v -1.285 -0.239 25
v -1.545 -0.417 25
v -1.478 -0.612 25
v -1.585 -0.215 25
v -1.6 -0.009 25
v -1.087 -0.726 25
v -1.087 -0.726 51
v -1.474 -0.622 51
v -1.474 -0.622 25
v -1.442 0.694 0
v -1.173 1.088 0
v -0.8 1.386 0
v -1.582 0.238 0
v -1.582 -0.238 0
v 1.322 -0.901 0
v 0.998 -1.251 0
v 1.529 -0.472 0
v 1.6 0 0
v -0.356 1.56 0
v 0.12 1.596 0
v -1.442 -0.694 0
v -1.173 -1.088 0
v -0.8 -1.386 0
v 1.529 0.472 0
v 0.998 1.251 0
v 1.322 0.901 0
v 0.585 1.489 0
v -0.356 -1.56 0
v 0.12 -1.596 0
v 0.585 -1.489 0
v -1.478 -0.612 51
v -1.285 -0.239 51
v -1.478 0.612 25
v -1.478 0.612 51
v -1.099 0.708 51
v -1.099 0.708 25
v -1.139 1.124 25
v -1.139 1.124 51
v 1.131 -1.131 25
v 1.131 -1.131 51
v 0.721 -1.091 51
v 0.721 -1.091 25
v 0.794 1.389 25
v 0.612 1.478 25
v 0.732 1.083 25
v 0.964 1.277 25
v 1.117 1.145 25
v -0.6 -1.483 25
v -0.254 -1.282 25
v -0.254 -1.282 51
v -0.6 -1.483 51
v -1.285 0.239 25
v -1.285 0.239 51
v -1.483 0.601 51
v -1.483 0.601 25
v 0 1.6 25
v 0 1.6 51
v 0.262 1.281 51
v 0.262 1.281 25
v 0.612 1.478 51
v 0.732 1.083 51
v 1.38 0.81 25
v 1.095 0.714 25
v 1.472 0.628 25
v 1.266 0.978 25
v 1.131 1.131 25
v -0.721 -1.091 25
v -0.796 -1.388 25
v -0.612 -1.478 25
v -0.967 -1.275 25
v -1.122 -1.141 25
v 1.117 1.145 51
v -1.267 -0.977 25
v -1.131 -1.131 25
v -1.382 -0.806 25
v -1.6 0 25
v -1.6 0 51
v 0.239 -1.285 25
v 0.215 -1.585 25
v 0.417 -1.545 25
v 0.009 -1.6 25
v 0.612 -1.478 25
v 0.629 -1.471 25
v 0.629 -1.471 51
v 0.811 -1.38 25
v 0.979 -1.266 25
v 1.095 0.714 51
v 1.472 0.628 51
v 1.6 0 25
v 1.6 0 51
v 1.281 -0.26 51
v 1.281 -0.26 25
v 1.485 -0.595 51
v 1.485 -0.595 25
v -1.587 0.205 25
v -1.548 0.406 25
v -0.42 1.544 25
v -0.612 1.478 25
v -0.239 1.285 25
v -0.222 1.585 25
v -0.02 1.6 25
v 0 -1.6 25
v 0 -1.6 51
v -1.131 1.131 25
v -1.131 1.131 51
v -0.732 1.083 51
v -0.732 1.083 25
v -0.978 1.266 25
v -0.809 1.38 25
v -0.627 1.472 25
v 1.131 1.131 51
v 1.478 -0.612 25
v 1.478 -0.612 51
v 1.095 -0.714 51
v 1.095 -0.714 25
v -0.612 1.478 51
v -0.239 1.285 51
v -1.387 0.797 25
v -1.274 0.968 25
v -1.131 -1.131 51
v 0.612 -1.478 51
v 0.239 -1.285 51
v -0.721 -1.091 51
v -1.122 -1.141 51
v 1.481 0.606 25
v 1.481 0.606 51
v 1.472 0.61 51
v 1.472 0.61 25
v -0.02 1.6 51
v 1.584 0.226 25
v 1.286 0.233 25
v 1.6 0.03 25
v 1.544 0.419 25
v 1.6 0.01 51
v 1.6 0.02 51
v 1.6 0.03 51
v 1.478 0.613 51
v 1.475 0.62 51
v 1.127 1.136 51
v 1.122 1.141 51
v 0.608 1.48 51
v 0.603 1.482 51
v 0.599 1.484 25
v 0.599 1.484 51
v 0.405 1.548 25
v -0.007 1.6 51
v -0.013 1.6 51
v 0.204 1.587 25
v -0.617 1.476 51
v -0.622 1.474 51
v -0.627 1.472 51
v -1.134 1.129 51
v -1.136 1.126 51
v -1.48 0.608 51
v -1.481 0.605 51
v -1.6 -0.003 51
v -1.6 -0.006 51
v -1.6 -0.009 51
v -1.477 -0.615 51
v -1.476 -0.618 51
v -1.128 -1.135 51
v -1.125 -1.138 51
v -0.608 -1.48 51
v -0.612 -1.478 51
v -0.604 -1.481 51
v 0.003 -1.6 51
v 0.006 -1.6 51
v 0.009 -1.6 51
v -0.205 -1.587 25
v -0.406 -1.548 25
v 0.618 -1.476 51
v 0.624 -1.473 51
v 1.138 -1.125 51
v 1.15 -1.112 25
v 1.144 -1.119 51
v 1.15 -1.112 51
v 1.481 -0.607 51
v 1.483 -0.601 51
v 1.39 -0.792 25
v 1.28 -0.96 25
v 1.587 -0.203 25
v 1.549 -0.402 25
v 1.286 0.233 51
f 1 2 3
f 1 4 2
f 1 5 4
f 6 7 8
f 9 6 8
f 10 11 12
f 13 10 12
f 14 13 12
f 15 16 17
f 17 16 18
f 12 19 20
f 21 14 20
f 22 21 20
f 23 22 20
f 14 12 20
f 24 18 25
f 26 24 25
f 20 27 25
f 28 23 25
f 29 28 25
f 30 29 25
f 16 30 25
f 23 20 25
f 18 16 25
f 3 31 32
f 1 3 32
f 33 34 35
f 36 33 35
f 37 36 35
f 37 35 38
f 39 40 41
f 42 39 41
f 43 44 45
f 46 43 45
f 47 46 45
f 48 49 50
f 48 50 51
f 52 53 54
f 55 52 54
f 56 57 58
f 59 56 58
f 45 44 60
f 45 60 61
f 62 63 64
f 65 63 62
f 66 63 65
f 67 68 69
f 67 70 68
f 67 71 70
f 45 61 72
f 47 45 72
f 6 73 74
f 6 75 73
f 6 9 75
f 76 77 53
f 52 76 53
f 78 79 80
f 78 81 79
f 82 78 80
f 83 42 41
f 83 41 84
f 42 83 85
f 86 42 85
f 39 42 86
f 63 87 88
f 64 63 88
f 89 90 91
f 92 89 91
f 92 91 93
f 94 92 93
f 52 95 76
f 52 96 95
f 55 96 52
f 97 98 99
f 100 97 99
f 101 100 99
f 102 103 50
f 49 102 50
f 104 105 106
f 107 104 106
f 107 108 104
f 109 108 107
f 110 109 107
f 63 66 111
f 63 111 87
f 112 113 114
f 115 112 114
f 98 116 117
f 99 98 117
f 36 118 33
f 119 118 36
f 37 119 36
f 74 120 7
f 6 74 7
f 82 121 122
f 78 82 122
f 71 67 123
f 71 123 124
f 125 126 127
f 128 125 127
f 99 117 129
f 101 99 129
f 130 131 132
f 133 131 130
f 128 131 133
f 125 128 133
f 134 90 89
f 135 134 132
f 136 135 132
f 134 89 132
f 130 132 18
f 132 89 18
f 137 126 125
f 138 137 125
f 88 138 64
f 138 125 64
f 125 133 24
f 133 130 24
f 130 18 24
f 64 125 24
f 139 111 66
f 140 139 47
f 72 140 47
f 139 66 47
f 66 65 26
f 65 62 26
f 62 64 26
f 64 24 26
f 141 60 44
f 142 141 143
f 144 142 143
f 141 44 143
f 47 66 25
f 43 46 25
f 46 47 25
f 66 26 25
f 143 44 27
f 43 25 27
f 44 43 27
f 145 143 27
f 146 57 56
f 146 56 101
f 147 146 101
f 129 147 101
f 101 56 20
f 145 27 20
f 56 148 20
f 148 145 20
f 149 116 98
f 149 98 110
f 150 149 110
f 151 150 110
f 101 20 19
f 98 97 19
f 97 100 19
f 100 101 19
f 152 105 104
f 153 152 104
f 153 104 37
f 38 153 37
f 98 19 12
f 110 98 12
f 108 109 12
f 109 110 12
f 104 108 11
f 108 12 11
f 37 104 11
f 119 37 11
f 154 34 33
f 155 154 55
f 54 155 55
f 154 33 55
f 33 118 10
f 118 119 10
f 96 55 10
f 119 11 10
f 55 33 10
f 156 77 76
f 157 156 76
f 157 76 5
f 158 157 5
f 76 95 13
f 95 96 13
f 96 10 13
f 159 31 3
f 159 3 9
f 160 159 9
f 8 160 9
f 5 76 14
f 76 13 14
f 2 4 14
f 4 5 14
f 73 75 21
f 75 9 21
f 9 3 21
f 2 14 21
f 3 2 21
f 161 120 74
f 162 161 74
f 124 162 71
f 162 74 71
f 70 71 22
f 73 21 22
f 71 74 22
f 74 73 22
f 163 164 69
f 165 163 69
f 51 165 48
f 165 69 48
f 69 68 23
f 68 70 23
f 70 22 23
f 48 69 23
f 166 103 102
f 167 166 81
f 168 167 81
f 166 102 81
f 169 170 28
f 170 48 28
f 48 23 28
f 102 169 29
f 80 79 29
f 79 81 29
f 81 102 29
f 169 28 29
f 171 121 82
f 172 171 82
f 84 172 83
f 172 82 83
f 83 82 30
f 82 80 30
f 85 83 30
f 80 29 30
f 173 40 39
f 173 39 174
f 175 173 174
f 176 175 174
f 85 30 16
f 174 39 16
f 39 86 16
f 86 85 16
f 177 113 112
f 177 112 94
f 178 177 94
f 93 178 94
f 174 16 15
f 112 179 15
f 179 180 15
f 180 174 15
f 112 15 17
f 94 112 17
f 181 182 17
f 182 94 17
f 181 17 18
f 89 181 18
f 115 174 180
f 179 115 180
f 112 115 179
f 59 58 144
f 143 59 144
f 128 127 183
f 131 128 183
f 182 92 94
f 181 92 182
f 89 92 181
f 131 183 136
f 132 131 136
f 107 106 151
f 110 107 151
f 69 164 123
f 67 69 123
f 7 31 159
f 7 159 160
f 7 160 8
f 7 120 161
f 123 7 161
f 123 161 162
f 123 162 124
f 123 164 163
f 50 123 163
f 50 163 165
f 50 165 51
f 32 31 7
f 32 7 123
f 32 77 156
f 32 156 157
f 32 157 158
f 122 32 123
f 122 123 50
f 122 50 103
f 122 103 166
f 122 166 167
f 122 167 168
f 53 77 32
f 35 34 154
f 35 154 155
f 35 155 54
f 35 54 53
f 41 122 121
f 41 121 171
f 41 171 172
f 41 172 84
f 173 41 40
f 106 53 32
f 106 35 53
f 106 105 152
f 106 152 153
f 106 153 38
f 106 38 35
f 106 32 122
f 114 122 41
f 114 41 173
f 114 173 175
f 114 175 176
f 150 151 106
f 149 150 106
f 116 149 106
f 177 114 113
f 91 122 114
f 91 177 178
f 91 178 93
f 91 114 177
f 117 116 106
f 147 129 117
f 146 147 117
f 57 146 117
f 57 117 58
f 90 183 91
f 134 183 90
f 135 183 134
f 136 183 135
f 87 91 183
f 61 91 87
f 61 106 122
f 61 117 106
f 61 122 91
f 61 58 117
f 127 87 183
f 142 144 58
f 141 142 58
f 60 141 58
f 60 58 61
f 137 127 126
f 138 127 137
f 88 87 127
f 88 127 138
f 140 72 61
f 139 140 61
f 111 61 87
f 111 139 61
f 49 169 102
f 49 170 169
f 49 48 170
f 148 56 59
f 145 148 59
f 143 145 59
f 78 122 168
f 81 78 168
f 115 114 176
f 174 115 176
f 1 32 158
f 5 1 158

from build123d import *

# Parameters (mm, degrees)
SKETCH1_R      = 1.6
EXTRUDE1_DEPTH = 51
EXTRUDE8_DEPTH = 26


with BuildPart() as part:
    # Sketch1 → Extrude1 (new body)
    with BuildSketch(Plane.XY):
        Circle(SKETCH1_R)
    extrude(amount=EXTRUDE1_DEPTH)

    # Sketch2 → Extrude8 (cut)
    with BuildSketch(Plane.XY.offset(51)):
        Polygon((1.286441807, 0.233094665), (1.599727071, 0.029551611), (1.873059743, 0.450254242), (1.471735058, 0.609612621), align=None)
        Polygon((1.6, 0), (1.281363749, -0.259562299), (1.485250033, -0.595006167), (1.785955756, -0.399980732), align=None)
        Polygon((1.478207252, -0.612293492), (1.095008295, -0.714298592), (1.15002382, -1.112405148), (1.560600042, -1.055666403), align=None)
        Polygon((1.13137085, -1.13137085), (0.720697062, -1.090807678), (0.629158613, -1.471108235), (1.033870669, -1.568522539), align=None)
        Polygon((0.612293492, -1.478207252), (0.238710912, -1.285411508), (0.009348192, -1.599972691), (0.334676963, -1.792391164), align=None)
        Polygon((0, -1.6), (-0.254390706, -1.282400489), (-0.600470531, -1.483049271), (-0.412348506, -1.807522895), align=None)
        Polygon((-0.612293492, -1.478207252), (-0.720697062, -1.090807678), (-1.121623142, -1.141035288), (-1.075884592, -1.506128861), align=None)
        Polygon((-1.13137085, -1.13137085), (-1.086958525, -0.726489374), (-1.474329588, -0.621572413), (-1.568528471, -0.969370531), align=None)
        Polygon((-1.478207252, -0.612293492), (-1.285411508, -0.238710912), (-1.599972691, -0.009348192), (-1.864675344, -0.389243799), align=None)
        Polygon((-1.6, 0), (-1.285411508, 0.238710912), (-1.482902222, 0.600833588), (-1.904214705, 0.37106255), align=None)
        Polygon((-1.478207252, 0.612293492), (-1.099318185, 0.707647634), (-1.138761595, 1.123931506), (-1.503705091, 1.08935266), align=None)
        Polygon((-1.13137085, 1.13137085), (-0.732466712, 1.082939592), (-0.627095181, 1.471989006), (-1.152553281, 1.43226765), align=None)
        Polygon((-0.612293492, 1.478207252), (-0.238710912, 1.285411508), (-0.019596398, 1.59987999), (-0.507182841, 1.659078234), align=None)
        Polygon((0, 1.6), (0.261567483, 1.280955931), (0.598789697, 1.483728715), (0.43006534, 1.601292025), (0.238504204, 1.734767485), align=None)
        Polygon((0.612293492, 1.478207252), (0.732466712, 1.082939592), (1.117347771, 1.145222231), (1.056496245, 1.5212596), align=None)
        Polygon((1.13137085, 1.13137085), (1.095008295, 0.714298592), (1.471735058, 0.627690942), (1.549987973, 0.992566635), align=None)
    extrude(amount=-EXTRUDE8_DEPTH, mode=Mode.SUBTRACT)


solid = part.part
